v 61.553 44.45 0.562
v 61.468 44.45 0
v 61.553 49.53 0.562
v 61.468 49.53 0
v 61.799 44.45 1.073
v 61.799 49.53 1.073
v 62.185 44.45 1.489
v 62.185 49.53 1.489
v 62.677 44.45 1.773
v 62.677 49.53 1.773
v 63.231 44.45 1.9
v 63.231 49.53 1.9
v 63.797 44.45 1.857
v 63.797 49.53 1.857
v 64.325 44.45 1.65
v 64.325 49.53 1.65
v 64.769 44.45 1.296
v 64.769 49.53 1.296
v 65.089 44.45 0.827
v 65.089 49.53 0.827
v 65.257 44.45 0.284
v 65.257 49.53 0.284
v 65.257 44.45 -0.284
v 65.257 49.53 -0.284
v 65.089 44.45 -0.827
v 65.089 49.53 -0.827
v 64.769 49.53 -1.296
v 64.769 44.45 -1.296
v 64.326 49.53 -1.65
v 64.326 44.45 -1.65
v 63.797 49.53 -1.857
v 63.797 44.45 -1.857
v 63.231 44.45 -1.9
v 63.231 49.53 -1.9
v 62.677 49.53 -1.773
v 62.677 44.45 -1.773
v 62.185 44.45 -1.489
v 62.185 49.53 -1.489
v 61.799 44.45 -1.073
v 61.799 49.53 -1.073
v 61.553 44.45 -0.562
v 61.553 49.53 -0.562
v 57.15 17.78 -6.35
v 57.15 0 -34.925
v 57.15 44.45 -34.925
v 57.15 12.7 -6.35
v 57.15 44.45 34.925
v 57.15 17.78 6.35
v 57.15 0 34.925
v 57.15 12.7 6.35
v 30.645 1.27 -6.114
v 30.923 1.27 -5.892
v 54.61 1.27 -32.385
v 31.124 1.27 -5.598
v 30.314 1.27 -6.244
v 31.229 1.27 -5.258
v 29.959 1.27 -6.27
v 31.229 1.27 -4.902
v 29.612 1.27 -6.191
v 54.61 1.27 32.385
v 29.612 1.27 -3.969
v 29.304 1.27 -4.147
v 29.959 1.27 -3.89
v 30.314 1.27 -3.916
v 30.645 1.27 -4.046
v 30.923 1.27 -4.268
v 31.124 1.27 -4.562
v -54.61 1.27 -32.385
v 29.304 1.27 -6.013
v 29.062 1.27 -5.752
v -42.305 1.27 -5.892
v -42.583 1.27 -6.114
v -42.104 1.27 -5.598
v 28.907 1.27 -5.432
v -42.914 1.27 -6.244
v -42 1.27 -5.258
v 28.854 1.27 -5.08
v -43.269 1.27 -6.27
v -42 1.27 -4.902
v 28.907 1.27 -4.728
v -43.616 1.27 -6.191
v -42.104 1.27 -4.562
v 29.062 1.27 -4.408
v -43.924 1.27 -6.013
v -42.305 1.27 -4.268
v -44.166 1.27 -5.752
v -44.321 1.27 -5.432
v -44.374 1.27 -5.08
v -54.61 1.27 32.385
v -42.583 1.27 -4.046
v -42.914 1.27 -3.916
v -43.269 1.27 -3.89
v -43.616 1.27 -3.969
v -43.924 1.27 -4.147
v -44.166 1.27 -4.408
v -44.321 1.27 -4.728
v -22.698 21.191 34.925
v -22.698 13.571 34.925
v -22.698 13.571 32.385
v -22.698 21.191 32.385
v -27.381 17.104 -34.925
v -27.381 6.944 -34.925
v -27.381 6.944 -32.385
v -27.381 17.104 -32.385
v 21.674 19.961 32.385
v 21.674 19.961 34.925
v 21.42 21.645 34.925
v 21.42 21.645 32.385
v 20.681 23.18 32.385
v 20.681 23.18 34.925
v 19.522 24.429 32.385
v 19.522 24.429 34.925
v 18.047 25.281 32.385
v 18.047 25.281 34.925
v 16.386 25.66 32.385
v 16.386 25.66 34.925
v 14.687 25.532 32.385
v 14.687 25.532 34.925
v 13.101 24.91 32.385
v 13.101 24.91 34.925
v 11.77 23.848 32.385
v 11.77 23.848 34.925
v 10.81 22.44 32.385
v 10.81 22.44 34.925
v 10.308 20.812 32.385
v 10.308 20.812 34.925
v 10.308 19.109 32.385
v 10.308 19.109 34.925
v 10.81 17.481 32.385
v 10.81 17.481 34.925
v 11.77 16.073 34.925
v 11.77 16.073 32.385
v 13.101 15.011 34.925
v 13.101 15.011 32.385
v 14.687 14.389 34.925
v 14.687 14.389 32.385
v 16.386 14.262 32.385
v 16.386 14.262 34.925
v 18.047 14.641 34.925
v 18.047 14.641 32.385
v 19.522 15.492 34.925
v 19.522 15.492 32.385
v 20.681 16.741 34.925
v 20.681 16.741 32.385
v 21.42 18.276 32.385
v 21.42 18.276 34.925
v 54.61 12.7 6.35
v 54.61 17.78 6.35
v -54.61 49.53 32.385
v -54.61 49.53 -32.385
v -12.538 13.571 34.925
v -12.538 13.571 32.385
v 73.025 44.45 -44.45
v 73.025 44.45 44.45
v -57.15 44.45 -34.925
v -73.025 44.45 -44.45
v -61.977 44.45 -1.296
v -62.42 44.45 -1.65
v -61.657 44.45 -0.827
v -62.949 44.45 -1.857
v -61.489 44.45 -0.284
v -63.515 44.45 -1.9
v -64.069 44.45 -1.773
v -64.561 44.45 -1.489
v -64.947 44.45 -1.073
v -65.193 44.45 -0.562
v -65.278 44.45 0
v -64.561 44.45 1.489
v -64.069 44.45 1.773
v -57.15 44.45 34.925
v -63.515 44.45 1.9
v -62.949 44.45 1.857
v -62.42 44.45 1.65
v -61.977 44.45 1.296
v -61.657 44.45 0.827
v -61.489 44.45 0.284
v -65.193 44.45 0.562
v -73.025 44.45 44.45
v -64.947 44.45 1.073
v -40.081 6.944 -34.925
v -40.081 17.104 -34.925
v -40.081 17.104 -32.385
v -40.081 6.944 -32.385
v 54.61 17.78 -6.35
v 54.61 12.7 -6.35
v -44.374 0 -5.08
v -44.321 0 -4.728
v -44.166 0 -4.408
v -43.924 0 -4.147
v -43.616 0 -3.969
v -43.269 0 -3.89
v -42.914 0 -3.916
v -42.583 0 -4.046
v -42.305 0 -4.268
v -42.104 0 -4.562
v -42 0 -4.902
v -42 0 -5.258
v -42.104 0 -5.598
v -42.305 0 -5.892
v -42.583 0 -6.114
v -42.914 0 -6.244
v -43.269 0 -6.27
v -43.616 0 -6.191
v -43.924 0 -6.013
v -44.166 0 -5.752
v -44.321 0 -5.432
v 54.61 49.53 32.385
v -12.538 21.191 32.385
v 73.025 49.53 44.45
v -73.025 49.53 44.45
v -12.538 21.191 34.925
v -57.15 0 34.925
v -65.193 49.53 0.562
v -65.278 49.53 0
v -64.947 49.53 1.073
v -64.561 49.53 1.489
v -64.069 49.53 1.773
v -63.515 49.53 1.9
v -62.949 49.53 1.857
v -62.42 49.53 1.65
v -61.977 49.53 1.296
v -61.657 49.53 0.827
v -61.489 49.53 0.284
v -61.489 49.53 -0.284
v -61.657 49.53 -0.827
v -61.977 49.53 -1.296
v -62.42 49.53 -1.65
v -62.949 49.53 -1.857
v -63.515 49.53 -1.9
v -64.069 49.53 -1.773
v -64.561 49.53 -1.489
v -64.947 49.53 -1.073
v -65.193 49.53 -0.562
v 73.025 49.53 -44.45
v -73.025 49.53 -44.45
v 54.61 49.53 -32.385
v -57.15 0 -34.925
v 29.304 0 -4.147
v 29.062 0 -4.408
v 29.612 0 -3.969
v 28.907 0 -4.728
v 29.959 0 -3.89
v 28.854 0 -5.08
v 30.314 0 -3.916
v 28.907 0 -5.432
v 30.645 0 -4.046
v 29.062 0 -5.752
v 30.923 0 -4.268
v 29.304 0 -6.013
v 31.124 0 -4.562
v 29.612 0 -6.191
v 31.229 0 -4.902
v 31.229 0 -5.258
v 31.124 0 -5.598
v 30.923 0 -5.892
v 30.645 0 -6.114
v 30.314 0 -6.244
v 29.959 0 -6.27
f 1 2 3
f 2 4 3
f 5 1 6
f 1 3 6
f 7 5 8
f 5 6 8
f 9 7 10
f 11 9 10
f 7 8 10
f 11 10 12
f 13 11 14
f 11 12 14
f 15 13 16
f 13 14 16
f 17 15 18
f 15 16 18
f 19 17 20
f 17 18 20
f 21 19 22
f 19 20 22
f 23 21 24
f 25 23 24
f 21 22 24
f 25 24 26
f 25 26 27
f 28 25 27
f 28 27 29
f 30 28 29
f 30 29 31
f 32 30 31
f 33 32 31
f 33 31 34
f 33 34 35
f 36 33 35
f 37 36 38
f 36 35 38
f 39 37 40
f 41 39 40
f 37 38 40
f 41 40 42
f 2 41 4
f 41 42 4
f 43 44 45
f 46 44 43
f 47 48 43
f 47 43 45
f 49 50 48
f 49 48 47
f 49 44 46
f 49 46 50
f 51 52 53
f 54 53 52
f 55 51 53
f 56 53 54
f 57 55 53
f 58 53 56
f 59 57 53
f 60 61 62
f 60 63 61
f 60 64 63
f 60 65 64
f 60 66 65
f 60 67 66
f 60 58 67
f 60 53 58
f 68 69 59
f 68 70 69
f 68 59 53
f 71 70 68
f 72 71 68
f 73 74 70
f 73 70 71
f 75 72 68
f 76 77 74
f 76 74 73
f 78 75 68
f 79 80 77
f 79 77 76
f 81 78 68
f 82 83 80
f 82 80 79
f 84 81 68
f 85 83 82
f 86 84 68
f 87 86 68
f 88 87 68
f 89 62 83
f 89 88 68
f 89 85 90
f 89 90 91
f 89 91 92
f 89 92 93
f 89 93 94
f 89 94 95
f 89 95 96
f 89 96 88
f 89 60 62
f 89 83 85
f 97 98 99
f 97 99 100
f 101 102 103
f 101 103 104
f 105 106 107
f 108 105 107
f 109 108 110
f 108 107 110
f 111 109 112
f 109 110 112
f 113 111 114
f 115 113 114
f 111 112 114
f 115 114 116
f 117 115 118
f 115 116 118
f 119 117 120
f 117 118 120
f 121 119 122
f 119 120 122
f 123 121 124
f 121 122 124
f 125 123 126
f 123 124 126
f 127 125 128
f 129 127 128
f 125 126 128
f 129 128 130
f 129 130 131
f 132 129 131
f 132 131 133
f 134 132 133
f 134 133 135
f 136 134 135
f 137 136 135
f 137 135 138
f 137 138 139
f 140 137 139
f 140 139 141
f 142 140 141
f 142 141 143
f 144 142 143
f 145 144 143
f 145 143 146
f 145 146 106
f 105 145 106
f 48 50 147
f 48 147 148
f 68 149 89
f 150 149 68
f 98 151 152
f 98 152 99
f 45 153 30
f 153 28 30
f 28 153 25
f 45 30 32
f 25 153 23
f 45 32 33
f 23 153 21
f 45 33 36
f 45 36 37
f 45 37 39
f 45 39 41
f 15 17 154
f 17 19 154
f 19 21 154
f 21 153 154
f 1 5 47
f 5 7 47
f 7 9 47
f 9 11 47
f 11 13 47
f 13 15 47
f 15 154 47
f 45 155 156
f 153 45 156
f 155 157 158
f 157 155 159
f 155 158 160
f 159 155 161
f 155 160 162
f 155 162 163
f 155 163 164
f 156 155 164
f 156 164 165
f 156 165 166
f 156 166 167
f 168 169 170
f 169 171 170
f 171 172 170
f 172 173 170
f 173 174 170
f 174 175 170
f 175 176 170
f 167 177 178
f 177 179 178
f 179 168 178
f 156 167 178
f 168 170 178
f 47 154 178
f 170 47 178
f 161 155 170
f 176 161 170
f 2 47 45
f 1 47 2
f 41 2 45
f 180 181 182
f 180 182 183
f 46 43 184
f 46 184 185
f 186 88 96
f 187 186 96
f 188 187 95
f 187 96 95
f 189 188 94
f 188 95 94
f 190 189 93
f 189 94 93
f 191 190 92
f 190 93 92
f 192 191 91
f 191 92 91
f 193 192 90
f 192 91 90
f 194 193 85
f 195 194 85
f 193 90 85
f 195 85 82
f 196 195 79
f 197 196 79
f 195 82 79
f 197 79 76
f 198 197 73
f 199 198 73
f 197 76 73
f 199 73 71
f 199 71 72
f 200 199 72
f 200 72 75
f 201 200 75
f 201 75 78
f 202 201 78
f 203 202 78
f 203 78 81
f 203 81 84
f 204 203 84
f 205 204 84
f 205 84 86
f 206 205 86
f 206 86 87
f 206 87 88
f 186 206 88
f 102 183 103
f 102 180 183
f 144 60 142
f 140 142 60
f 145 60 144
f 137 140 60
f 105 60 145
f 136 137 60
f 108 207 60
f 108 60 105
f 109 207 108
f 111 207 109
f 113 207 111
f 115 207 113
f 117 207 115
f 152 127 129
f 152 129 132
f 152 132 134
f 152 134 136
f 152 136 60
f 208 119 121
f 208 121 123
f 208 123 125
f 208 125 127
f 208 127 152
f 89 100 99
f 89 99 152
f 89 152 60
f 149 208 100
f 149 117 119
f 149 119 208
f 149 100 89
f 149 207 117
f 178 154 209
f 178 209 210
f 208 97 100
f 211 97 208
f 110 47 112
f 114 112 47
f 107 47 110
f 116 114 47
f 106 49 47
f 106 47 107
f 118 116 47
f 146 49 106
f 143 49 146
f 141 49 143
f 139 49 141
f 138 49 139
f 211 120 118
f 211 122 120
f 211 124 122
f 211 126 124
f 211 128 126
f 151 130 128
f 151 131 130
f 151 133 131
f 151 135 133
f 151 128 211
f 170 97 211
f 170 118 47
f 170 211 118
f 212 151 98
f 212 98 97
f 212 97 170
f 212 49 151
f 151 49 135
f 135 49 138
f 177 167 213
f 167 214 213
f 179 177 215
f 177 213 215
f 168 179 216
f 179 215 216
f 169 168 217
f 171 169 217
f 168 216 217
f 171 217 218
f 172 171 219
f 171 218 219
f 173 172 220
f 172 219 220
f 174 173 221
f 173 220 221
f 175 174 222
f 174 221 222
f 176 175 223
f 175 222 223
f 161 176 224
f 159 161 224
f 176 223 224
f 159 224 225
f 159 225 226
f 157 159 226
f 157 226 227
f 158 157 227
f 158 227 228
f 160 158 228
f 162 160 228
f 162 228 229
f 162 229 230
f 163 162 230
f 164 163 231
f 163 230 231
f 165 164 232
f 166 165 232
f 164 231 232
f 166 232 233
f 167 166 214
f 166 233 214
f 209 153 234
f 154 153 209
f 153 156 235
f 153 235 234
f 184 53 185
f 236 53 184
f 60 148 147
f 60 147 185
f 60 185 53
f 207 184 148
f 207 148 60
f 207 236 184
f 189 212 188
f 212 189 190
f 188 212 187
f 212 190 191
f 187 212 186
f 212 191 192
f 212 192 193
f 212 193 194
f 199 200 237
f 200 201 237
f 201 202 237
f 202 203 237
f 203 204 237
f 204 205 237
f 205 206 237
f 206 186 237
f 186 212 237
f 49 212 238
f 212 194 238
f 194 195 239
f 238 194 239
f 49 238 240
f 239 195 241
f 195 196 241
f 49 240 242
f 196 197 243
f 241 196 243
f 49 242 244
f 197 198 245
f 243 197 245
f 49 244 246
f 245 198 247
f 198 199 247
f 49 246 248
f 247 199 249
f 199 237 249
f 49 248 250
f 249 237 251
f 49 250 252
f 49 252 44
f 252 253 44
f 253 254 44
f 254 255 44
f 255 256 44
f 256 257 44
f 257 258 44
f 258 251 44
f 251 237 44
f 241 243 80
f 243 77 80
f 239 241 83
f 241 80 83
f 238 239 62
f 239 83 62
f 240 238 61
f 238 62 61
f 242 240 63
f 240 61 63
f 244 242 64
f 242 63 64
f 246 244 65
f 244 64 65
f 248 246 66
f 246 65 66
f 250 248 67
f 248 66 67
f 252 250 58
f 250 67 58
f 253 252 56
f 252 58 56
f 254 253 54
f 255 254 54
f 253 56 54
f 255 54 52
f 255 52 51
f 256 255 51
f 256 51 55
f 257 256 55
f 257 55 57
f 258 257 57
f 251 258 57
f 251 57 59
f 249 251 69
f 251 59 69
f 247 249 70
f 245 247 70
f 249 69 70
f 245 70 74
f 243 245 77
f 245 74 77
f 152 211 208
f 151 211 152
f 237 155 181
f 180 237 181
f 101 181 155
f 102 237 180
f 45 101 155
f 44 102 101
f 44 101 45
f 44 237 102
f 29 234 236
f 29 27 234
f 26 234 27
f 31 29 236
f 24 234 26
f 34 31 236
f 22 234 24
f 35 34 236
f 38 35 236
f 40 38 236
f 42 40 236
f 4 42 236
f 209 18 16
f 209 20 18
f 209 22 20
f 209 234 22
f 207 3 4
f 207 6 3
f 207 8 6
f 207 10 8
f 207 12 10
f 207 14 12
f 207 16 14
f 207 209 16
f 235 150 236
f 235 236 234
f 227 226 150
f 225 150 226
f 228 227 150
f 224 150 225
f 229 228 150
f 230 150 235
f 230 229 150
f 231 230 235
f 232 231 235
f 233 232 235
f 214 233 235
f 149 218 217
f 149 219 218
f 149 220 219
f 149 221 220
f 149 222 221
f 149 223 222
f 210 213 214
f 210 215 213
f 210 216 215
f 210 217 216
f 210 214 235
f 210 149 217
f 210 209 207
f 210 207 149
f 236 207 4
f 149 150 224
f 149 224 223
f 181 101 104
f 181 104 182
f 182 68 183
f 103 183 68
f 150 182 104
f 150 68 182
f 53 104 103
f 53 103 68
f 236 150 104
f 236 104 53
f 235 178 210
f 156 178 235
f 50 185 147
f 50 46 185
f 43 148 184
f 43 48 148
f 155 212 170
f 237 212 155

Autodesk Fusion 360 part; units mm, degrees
sketch "Sketch1" plane through (0, 0, 0) normal (0, 1, 0) x (1, 0, 0)
  line L0 (57.15, -34.925) -> (-57.15, -34.925)
  line L1 (-57.15, -34.925) -> (-57.15, 34.925)
  line L2 (-57.15, 34.925) -> (57.15, 34.925)
  line L3 (57.15, 34.925) -> (57.15, -34.925)
  line L4 (57.15, -34.925) -> (-57.15, 34.925) construction
  line L5 (-57.15, -34.925) -> (57.15, 34.925) construction
  dimension "d1" = 114.3
  dimension "d2" = 69.85
extrude "Extrude1" add sketch "Sketch1" along normal blind 44.45
sketch "Sketch10" plane through (0, 44.45, 0) normal (0, 1, 0) x (-1, 0, 0)
  line L0 (-57.15, -34.925) -> (57.15, -34.925)
  line L1 (57.15, -34.925) -> (57.15, 34.925)
  line L2 (57.15, 34.925) -> (-57.15, 34.925)
  line L3 (-57.15, 34.925) -> (-57.15, -34.925)
  line L4 (-73.025, 44.45) -> (73.025, 44.45)
  line L5 (73.025, 44.45) -> (73.025, -44.45)
  line L6 (73.025, -44.45) -> (-73.025, -44.45)
  line L7 (-73.025, -44.45) -> (-73.025, 44.45)
  line L8 (-73.025, 44.45) -> (73.025, -44.45) construction
  line L9 (73.025, 44.45) -> (-73.025, -44.45) construction
  dimension "d55" = 146.05
  dimension "d56" = 88.9
extrude "Extrude14" add sketch "Sketch10" along normal blind 5.08 contours L0 L1 L2 L3 | L4 L5 L6 L7
sketch "Sketch11" plane through (0, 49.53, 0) normal (0, 1, 0) x (-1, 0, 0)
  line L0 (-73.025, -44.45) -> (73.025, -44.45)
  line L1 (73.025, -44.45) -> (73.025, 44.45)
  line L2 (73.025, 44.45) -> (-73.025, 44.45)
  line L3 (-73.025, 44.45) -> (-73.025, -44.45)
  line L4 (57.15, -34.925) -> (-57.15, -34.925)
  line L5 (-57.15, -34.925) -> (-57.15, 34.925)
  line L6 (-57.15, 34.925) -> (57.15, 34.925)
  line L7 (57.15, 34.925) -> (57.15, -34.925)
  line L8 (63.5, -38.1) -> (-63.5, -38.1)
  line L9 (-63.5, -38.1) -> (-63.5, 38.1)
  line L10 (-63.5, 38.1) -> (63.5, 38.1)
  line L11 (63.5, 38.1) -> (63.5, -38.1)
  line L12 (63.5, -38.1) -> (-63.5, 38.1) construction
  line L13 (-63.5, -38.1) -> (63.5, 38.1) construction
  dimension "d61" = 127
  dimension "d62" = 76.2
sketch "Sketch27" plane through (0, 49.53, 0) normal (0, 1, 0) x (-1, 0, 0)
  line L0 (-73.025, -44.45) -> (73.025, -44.45)
  line L1 (73.025, -44.45) -> (73.025, 44.45)
  line L2 (73.025, 44.45) -> (-73.025, 44.45)
  line L3 (-73.025, 44.45) -> (-73.025, -44.45)
  line L4 (57.15, -34.925) -> (-57.15, -34.925)
  line L5 (-57.15, -34.925) -> (-57.15, 34.925)
  line L6 (-57.15, 34.925) -> (57.15, 34.925)
  line L7 (57.15, 34.925) -> (57.15, -34.925)
  line L8 (-54.61, 32.385) -> (54.61, 32.385)
  line L9 (54.61, 32.385) -> (54.61, -32.385)
  line L10 (54.61, -32.385) -> (-54.61, -32.385)
  line L11 (-54.61, -32.385) -> (-54.61, 32.385)
  dimension "d89" = 2.54
extrude "Extrude22" cut sketch "Sketch27" against normal blind 48.26 contours L8 L9 L10 L11
sketch "Sketch28" plane through (0, 49.53, 0) normal (0, 1, 0) x (-1, 0, 0)
  line L0 (54.61, 32.385) -> (54.61, -32.385)
  line L1 (54.61, -32.385) -> (-54.61, -32.385)
  line L2 (-54.61, -32.385) -> (-54.61, 32.385)
  line L3 (-54.61, 32.385) -> (54.61, 32.385)
  line L4 (-73.025, -44.45) -> (73.025, -44.45)
  line L5 (73.025, -44.45) -> (73.025, 44.45)
  line L6 (73.025, 44.45) -> (-73.025, 44.45)
  line L7 (-73.025, 44.45) -> (-73.025, -44.45)
  circle A0 centre (63.373, 0) radius 1.905
  line L8 (0, 0) -> (0, 7.62)
  circle A1 centre (-63.373, 0) radius 1.905
  dimension "d92" = 3.81
  dimension "d93" = 9.652
extrude "Extrude23" cut sketch "Sketch28" against normal blind 38.1 contours A0 | A1
sketch "Sketch29" plane through (0, 0, 34.925) normal (0, 0, 1) x (1, 0, 0)
  line L0 (-57.15, 0) -> (57.15, 0)
  line L1 (57.15, 0) -> (57.15, 44.45)
  line L2 (57.15, 44.45) -> (-57.15, 44.45)
  line L3 (-57.15, 44.45) -> (-57.15, 0)
  line L4 (-22.698, 21.1911) -> (-12.538, 21.1911)
  line L5 (-12.538, 21.1911) -> (-12.538, 13.5711)
  line L6 (-12.538, 13.5711) -> (-22.698, 13.5711)
  line L7 (-22.698, 13.5711) -> (-22.698, 21.1911)
  circle A0 centre (15.9589, 19.9606) radius 5.715
  dimension "d96" = 10.16
  dimension "d97" = 7.62
  dimension "d98" = 11.43
sketch "Sketch30" plane through (0, 0, -34.925) normal (0, 0, -1) x (-1, 0, 0)
  line L0 (-57.15, 0) -> (57.15, 0)
  line L1 (57.15, 0) -> (57.15, 44.45)
  line L2 (57.15, 44.45) -> (-57.15, 44.45)
  line L3 (-57.15, 44.45) -> (-57.15, 0)
  line L4 (40.0812, 6.9441) -> (27.3812, 6.9441)
  line L5 (27.3812, 6.9441) -> (27.3812, 17.1041)
  line L6 (27.3812, 17.1041) -> (40.0812, 17.1041)
  line L7 (40.0812, 17.1041) -> (40.0812, 6.9441)
  dimension "d114" = 12.7
  dimension "d115" = 10.16
sketch "Sketch31" plane through (57.15, 0, 0) normal (1, 0, 0) x (0, 0, -1)
  line L0 (-34.925, 0) -> (34.925, 0)
  line L1 (34.925, 0) -> (34.925, 44.45)
  line L2 (34.925, 44.45) -> (-34.925, 44.45)
  line L3 (-34.925, 44.45) -> (-34.925, 0)
  line L4 (6.35, 12.7) -> (-6.35, 12.7)
  line L5 (-6.35, 12.7) -> (-6.35, 17.78)
  line L6 (-6.35, 17.78) -> (6.35, 17.78)
  line L7 (6.35, 17.78) -> (6.35, 12.7)
  line L8 (6.35, 12.7) -> (-6.35, 17.78) construction
  line L9 (-6.35, 12.7) -> (6.35, 17.78) construction
  point P0 (0, 15.24)
  dimension "d101" = 12.7
  dimension "d102" = 5.08
extrude "Extrude24" cut sketch "Sketch29" against normal blind 40.64 contours L4 L5 L6 L7 | A0
extrude "Extrude25" cut sketch "Sketch30" against normal blind 33.02 contours L4 L5 L6 L7
extrude "Extrude26" cut sketch "Sketch31" against normal blind 33.02 contours L4 L5 L6 L7
sketch "Sketch32" plane through (0, 1.27, 0) normal (0, 1, 0) x (-1, 0, 0)
  line L0 (-54.61, -32.385) -> (54.61, -32.385)
  line L1 (54.61, -32.385) -> (54.61, 32.385)
  line L2 (54.61, 32.385) -> (-54.61, 32.385)
  line L3 (-54.61, 32.385) -> (-54.61, -32.385)
  circle A0 centre (43.18, -5.08) radius 1.1938
  line L4 (43.18, -5.08) -> (-30.0482, -5.08)
  circle A1 centre (-30.0482, -5.08) radius 1.1938
  dimension "d109" = 2.3876
  dimension "d110" = 73.2282
  dimension "d111" = 2.3876
extrude "Extrude27" cut sketch "Sketch32" against normal blind 10.16 contours A0 | A1
